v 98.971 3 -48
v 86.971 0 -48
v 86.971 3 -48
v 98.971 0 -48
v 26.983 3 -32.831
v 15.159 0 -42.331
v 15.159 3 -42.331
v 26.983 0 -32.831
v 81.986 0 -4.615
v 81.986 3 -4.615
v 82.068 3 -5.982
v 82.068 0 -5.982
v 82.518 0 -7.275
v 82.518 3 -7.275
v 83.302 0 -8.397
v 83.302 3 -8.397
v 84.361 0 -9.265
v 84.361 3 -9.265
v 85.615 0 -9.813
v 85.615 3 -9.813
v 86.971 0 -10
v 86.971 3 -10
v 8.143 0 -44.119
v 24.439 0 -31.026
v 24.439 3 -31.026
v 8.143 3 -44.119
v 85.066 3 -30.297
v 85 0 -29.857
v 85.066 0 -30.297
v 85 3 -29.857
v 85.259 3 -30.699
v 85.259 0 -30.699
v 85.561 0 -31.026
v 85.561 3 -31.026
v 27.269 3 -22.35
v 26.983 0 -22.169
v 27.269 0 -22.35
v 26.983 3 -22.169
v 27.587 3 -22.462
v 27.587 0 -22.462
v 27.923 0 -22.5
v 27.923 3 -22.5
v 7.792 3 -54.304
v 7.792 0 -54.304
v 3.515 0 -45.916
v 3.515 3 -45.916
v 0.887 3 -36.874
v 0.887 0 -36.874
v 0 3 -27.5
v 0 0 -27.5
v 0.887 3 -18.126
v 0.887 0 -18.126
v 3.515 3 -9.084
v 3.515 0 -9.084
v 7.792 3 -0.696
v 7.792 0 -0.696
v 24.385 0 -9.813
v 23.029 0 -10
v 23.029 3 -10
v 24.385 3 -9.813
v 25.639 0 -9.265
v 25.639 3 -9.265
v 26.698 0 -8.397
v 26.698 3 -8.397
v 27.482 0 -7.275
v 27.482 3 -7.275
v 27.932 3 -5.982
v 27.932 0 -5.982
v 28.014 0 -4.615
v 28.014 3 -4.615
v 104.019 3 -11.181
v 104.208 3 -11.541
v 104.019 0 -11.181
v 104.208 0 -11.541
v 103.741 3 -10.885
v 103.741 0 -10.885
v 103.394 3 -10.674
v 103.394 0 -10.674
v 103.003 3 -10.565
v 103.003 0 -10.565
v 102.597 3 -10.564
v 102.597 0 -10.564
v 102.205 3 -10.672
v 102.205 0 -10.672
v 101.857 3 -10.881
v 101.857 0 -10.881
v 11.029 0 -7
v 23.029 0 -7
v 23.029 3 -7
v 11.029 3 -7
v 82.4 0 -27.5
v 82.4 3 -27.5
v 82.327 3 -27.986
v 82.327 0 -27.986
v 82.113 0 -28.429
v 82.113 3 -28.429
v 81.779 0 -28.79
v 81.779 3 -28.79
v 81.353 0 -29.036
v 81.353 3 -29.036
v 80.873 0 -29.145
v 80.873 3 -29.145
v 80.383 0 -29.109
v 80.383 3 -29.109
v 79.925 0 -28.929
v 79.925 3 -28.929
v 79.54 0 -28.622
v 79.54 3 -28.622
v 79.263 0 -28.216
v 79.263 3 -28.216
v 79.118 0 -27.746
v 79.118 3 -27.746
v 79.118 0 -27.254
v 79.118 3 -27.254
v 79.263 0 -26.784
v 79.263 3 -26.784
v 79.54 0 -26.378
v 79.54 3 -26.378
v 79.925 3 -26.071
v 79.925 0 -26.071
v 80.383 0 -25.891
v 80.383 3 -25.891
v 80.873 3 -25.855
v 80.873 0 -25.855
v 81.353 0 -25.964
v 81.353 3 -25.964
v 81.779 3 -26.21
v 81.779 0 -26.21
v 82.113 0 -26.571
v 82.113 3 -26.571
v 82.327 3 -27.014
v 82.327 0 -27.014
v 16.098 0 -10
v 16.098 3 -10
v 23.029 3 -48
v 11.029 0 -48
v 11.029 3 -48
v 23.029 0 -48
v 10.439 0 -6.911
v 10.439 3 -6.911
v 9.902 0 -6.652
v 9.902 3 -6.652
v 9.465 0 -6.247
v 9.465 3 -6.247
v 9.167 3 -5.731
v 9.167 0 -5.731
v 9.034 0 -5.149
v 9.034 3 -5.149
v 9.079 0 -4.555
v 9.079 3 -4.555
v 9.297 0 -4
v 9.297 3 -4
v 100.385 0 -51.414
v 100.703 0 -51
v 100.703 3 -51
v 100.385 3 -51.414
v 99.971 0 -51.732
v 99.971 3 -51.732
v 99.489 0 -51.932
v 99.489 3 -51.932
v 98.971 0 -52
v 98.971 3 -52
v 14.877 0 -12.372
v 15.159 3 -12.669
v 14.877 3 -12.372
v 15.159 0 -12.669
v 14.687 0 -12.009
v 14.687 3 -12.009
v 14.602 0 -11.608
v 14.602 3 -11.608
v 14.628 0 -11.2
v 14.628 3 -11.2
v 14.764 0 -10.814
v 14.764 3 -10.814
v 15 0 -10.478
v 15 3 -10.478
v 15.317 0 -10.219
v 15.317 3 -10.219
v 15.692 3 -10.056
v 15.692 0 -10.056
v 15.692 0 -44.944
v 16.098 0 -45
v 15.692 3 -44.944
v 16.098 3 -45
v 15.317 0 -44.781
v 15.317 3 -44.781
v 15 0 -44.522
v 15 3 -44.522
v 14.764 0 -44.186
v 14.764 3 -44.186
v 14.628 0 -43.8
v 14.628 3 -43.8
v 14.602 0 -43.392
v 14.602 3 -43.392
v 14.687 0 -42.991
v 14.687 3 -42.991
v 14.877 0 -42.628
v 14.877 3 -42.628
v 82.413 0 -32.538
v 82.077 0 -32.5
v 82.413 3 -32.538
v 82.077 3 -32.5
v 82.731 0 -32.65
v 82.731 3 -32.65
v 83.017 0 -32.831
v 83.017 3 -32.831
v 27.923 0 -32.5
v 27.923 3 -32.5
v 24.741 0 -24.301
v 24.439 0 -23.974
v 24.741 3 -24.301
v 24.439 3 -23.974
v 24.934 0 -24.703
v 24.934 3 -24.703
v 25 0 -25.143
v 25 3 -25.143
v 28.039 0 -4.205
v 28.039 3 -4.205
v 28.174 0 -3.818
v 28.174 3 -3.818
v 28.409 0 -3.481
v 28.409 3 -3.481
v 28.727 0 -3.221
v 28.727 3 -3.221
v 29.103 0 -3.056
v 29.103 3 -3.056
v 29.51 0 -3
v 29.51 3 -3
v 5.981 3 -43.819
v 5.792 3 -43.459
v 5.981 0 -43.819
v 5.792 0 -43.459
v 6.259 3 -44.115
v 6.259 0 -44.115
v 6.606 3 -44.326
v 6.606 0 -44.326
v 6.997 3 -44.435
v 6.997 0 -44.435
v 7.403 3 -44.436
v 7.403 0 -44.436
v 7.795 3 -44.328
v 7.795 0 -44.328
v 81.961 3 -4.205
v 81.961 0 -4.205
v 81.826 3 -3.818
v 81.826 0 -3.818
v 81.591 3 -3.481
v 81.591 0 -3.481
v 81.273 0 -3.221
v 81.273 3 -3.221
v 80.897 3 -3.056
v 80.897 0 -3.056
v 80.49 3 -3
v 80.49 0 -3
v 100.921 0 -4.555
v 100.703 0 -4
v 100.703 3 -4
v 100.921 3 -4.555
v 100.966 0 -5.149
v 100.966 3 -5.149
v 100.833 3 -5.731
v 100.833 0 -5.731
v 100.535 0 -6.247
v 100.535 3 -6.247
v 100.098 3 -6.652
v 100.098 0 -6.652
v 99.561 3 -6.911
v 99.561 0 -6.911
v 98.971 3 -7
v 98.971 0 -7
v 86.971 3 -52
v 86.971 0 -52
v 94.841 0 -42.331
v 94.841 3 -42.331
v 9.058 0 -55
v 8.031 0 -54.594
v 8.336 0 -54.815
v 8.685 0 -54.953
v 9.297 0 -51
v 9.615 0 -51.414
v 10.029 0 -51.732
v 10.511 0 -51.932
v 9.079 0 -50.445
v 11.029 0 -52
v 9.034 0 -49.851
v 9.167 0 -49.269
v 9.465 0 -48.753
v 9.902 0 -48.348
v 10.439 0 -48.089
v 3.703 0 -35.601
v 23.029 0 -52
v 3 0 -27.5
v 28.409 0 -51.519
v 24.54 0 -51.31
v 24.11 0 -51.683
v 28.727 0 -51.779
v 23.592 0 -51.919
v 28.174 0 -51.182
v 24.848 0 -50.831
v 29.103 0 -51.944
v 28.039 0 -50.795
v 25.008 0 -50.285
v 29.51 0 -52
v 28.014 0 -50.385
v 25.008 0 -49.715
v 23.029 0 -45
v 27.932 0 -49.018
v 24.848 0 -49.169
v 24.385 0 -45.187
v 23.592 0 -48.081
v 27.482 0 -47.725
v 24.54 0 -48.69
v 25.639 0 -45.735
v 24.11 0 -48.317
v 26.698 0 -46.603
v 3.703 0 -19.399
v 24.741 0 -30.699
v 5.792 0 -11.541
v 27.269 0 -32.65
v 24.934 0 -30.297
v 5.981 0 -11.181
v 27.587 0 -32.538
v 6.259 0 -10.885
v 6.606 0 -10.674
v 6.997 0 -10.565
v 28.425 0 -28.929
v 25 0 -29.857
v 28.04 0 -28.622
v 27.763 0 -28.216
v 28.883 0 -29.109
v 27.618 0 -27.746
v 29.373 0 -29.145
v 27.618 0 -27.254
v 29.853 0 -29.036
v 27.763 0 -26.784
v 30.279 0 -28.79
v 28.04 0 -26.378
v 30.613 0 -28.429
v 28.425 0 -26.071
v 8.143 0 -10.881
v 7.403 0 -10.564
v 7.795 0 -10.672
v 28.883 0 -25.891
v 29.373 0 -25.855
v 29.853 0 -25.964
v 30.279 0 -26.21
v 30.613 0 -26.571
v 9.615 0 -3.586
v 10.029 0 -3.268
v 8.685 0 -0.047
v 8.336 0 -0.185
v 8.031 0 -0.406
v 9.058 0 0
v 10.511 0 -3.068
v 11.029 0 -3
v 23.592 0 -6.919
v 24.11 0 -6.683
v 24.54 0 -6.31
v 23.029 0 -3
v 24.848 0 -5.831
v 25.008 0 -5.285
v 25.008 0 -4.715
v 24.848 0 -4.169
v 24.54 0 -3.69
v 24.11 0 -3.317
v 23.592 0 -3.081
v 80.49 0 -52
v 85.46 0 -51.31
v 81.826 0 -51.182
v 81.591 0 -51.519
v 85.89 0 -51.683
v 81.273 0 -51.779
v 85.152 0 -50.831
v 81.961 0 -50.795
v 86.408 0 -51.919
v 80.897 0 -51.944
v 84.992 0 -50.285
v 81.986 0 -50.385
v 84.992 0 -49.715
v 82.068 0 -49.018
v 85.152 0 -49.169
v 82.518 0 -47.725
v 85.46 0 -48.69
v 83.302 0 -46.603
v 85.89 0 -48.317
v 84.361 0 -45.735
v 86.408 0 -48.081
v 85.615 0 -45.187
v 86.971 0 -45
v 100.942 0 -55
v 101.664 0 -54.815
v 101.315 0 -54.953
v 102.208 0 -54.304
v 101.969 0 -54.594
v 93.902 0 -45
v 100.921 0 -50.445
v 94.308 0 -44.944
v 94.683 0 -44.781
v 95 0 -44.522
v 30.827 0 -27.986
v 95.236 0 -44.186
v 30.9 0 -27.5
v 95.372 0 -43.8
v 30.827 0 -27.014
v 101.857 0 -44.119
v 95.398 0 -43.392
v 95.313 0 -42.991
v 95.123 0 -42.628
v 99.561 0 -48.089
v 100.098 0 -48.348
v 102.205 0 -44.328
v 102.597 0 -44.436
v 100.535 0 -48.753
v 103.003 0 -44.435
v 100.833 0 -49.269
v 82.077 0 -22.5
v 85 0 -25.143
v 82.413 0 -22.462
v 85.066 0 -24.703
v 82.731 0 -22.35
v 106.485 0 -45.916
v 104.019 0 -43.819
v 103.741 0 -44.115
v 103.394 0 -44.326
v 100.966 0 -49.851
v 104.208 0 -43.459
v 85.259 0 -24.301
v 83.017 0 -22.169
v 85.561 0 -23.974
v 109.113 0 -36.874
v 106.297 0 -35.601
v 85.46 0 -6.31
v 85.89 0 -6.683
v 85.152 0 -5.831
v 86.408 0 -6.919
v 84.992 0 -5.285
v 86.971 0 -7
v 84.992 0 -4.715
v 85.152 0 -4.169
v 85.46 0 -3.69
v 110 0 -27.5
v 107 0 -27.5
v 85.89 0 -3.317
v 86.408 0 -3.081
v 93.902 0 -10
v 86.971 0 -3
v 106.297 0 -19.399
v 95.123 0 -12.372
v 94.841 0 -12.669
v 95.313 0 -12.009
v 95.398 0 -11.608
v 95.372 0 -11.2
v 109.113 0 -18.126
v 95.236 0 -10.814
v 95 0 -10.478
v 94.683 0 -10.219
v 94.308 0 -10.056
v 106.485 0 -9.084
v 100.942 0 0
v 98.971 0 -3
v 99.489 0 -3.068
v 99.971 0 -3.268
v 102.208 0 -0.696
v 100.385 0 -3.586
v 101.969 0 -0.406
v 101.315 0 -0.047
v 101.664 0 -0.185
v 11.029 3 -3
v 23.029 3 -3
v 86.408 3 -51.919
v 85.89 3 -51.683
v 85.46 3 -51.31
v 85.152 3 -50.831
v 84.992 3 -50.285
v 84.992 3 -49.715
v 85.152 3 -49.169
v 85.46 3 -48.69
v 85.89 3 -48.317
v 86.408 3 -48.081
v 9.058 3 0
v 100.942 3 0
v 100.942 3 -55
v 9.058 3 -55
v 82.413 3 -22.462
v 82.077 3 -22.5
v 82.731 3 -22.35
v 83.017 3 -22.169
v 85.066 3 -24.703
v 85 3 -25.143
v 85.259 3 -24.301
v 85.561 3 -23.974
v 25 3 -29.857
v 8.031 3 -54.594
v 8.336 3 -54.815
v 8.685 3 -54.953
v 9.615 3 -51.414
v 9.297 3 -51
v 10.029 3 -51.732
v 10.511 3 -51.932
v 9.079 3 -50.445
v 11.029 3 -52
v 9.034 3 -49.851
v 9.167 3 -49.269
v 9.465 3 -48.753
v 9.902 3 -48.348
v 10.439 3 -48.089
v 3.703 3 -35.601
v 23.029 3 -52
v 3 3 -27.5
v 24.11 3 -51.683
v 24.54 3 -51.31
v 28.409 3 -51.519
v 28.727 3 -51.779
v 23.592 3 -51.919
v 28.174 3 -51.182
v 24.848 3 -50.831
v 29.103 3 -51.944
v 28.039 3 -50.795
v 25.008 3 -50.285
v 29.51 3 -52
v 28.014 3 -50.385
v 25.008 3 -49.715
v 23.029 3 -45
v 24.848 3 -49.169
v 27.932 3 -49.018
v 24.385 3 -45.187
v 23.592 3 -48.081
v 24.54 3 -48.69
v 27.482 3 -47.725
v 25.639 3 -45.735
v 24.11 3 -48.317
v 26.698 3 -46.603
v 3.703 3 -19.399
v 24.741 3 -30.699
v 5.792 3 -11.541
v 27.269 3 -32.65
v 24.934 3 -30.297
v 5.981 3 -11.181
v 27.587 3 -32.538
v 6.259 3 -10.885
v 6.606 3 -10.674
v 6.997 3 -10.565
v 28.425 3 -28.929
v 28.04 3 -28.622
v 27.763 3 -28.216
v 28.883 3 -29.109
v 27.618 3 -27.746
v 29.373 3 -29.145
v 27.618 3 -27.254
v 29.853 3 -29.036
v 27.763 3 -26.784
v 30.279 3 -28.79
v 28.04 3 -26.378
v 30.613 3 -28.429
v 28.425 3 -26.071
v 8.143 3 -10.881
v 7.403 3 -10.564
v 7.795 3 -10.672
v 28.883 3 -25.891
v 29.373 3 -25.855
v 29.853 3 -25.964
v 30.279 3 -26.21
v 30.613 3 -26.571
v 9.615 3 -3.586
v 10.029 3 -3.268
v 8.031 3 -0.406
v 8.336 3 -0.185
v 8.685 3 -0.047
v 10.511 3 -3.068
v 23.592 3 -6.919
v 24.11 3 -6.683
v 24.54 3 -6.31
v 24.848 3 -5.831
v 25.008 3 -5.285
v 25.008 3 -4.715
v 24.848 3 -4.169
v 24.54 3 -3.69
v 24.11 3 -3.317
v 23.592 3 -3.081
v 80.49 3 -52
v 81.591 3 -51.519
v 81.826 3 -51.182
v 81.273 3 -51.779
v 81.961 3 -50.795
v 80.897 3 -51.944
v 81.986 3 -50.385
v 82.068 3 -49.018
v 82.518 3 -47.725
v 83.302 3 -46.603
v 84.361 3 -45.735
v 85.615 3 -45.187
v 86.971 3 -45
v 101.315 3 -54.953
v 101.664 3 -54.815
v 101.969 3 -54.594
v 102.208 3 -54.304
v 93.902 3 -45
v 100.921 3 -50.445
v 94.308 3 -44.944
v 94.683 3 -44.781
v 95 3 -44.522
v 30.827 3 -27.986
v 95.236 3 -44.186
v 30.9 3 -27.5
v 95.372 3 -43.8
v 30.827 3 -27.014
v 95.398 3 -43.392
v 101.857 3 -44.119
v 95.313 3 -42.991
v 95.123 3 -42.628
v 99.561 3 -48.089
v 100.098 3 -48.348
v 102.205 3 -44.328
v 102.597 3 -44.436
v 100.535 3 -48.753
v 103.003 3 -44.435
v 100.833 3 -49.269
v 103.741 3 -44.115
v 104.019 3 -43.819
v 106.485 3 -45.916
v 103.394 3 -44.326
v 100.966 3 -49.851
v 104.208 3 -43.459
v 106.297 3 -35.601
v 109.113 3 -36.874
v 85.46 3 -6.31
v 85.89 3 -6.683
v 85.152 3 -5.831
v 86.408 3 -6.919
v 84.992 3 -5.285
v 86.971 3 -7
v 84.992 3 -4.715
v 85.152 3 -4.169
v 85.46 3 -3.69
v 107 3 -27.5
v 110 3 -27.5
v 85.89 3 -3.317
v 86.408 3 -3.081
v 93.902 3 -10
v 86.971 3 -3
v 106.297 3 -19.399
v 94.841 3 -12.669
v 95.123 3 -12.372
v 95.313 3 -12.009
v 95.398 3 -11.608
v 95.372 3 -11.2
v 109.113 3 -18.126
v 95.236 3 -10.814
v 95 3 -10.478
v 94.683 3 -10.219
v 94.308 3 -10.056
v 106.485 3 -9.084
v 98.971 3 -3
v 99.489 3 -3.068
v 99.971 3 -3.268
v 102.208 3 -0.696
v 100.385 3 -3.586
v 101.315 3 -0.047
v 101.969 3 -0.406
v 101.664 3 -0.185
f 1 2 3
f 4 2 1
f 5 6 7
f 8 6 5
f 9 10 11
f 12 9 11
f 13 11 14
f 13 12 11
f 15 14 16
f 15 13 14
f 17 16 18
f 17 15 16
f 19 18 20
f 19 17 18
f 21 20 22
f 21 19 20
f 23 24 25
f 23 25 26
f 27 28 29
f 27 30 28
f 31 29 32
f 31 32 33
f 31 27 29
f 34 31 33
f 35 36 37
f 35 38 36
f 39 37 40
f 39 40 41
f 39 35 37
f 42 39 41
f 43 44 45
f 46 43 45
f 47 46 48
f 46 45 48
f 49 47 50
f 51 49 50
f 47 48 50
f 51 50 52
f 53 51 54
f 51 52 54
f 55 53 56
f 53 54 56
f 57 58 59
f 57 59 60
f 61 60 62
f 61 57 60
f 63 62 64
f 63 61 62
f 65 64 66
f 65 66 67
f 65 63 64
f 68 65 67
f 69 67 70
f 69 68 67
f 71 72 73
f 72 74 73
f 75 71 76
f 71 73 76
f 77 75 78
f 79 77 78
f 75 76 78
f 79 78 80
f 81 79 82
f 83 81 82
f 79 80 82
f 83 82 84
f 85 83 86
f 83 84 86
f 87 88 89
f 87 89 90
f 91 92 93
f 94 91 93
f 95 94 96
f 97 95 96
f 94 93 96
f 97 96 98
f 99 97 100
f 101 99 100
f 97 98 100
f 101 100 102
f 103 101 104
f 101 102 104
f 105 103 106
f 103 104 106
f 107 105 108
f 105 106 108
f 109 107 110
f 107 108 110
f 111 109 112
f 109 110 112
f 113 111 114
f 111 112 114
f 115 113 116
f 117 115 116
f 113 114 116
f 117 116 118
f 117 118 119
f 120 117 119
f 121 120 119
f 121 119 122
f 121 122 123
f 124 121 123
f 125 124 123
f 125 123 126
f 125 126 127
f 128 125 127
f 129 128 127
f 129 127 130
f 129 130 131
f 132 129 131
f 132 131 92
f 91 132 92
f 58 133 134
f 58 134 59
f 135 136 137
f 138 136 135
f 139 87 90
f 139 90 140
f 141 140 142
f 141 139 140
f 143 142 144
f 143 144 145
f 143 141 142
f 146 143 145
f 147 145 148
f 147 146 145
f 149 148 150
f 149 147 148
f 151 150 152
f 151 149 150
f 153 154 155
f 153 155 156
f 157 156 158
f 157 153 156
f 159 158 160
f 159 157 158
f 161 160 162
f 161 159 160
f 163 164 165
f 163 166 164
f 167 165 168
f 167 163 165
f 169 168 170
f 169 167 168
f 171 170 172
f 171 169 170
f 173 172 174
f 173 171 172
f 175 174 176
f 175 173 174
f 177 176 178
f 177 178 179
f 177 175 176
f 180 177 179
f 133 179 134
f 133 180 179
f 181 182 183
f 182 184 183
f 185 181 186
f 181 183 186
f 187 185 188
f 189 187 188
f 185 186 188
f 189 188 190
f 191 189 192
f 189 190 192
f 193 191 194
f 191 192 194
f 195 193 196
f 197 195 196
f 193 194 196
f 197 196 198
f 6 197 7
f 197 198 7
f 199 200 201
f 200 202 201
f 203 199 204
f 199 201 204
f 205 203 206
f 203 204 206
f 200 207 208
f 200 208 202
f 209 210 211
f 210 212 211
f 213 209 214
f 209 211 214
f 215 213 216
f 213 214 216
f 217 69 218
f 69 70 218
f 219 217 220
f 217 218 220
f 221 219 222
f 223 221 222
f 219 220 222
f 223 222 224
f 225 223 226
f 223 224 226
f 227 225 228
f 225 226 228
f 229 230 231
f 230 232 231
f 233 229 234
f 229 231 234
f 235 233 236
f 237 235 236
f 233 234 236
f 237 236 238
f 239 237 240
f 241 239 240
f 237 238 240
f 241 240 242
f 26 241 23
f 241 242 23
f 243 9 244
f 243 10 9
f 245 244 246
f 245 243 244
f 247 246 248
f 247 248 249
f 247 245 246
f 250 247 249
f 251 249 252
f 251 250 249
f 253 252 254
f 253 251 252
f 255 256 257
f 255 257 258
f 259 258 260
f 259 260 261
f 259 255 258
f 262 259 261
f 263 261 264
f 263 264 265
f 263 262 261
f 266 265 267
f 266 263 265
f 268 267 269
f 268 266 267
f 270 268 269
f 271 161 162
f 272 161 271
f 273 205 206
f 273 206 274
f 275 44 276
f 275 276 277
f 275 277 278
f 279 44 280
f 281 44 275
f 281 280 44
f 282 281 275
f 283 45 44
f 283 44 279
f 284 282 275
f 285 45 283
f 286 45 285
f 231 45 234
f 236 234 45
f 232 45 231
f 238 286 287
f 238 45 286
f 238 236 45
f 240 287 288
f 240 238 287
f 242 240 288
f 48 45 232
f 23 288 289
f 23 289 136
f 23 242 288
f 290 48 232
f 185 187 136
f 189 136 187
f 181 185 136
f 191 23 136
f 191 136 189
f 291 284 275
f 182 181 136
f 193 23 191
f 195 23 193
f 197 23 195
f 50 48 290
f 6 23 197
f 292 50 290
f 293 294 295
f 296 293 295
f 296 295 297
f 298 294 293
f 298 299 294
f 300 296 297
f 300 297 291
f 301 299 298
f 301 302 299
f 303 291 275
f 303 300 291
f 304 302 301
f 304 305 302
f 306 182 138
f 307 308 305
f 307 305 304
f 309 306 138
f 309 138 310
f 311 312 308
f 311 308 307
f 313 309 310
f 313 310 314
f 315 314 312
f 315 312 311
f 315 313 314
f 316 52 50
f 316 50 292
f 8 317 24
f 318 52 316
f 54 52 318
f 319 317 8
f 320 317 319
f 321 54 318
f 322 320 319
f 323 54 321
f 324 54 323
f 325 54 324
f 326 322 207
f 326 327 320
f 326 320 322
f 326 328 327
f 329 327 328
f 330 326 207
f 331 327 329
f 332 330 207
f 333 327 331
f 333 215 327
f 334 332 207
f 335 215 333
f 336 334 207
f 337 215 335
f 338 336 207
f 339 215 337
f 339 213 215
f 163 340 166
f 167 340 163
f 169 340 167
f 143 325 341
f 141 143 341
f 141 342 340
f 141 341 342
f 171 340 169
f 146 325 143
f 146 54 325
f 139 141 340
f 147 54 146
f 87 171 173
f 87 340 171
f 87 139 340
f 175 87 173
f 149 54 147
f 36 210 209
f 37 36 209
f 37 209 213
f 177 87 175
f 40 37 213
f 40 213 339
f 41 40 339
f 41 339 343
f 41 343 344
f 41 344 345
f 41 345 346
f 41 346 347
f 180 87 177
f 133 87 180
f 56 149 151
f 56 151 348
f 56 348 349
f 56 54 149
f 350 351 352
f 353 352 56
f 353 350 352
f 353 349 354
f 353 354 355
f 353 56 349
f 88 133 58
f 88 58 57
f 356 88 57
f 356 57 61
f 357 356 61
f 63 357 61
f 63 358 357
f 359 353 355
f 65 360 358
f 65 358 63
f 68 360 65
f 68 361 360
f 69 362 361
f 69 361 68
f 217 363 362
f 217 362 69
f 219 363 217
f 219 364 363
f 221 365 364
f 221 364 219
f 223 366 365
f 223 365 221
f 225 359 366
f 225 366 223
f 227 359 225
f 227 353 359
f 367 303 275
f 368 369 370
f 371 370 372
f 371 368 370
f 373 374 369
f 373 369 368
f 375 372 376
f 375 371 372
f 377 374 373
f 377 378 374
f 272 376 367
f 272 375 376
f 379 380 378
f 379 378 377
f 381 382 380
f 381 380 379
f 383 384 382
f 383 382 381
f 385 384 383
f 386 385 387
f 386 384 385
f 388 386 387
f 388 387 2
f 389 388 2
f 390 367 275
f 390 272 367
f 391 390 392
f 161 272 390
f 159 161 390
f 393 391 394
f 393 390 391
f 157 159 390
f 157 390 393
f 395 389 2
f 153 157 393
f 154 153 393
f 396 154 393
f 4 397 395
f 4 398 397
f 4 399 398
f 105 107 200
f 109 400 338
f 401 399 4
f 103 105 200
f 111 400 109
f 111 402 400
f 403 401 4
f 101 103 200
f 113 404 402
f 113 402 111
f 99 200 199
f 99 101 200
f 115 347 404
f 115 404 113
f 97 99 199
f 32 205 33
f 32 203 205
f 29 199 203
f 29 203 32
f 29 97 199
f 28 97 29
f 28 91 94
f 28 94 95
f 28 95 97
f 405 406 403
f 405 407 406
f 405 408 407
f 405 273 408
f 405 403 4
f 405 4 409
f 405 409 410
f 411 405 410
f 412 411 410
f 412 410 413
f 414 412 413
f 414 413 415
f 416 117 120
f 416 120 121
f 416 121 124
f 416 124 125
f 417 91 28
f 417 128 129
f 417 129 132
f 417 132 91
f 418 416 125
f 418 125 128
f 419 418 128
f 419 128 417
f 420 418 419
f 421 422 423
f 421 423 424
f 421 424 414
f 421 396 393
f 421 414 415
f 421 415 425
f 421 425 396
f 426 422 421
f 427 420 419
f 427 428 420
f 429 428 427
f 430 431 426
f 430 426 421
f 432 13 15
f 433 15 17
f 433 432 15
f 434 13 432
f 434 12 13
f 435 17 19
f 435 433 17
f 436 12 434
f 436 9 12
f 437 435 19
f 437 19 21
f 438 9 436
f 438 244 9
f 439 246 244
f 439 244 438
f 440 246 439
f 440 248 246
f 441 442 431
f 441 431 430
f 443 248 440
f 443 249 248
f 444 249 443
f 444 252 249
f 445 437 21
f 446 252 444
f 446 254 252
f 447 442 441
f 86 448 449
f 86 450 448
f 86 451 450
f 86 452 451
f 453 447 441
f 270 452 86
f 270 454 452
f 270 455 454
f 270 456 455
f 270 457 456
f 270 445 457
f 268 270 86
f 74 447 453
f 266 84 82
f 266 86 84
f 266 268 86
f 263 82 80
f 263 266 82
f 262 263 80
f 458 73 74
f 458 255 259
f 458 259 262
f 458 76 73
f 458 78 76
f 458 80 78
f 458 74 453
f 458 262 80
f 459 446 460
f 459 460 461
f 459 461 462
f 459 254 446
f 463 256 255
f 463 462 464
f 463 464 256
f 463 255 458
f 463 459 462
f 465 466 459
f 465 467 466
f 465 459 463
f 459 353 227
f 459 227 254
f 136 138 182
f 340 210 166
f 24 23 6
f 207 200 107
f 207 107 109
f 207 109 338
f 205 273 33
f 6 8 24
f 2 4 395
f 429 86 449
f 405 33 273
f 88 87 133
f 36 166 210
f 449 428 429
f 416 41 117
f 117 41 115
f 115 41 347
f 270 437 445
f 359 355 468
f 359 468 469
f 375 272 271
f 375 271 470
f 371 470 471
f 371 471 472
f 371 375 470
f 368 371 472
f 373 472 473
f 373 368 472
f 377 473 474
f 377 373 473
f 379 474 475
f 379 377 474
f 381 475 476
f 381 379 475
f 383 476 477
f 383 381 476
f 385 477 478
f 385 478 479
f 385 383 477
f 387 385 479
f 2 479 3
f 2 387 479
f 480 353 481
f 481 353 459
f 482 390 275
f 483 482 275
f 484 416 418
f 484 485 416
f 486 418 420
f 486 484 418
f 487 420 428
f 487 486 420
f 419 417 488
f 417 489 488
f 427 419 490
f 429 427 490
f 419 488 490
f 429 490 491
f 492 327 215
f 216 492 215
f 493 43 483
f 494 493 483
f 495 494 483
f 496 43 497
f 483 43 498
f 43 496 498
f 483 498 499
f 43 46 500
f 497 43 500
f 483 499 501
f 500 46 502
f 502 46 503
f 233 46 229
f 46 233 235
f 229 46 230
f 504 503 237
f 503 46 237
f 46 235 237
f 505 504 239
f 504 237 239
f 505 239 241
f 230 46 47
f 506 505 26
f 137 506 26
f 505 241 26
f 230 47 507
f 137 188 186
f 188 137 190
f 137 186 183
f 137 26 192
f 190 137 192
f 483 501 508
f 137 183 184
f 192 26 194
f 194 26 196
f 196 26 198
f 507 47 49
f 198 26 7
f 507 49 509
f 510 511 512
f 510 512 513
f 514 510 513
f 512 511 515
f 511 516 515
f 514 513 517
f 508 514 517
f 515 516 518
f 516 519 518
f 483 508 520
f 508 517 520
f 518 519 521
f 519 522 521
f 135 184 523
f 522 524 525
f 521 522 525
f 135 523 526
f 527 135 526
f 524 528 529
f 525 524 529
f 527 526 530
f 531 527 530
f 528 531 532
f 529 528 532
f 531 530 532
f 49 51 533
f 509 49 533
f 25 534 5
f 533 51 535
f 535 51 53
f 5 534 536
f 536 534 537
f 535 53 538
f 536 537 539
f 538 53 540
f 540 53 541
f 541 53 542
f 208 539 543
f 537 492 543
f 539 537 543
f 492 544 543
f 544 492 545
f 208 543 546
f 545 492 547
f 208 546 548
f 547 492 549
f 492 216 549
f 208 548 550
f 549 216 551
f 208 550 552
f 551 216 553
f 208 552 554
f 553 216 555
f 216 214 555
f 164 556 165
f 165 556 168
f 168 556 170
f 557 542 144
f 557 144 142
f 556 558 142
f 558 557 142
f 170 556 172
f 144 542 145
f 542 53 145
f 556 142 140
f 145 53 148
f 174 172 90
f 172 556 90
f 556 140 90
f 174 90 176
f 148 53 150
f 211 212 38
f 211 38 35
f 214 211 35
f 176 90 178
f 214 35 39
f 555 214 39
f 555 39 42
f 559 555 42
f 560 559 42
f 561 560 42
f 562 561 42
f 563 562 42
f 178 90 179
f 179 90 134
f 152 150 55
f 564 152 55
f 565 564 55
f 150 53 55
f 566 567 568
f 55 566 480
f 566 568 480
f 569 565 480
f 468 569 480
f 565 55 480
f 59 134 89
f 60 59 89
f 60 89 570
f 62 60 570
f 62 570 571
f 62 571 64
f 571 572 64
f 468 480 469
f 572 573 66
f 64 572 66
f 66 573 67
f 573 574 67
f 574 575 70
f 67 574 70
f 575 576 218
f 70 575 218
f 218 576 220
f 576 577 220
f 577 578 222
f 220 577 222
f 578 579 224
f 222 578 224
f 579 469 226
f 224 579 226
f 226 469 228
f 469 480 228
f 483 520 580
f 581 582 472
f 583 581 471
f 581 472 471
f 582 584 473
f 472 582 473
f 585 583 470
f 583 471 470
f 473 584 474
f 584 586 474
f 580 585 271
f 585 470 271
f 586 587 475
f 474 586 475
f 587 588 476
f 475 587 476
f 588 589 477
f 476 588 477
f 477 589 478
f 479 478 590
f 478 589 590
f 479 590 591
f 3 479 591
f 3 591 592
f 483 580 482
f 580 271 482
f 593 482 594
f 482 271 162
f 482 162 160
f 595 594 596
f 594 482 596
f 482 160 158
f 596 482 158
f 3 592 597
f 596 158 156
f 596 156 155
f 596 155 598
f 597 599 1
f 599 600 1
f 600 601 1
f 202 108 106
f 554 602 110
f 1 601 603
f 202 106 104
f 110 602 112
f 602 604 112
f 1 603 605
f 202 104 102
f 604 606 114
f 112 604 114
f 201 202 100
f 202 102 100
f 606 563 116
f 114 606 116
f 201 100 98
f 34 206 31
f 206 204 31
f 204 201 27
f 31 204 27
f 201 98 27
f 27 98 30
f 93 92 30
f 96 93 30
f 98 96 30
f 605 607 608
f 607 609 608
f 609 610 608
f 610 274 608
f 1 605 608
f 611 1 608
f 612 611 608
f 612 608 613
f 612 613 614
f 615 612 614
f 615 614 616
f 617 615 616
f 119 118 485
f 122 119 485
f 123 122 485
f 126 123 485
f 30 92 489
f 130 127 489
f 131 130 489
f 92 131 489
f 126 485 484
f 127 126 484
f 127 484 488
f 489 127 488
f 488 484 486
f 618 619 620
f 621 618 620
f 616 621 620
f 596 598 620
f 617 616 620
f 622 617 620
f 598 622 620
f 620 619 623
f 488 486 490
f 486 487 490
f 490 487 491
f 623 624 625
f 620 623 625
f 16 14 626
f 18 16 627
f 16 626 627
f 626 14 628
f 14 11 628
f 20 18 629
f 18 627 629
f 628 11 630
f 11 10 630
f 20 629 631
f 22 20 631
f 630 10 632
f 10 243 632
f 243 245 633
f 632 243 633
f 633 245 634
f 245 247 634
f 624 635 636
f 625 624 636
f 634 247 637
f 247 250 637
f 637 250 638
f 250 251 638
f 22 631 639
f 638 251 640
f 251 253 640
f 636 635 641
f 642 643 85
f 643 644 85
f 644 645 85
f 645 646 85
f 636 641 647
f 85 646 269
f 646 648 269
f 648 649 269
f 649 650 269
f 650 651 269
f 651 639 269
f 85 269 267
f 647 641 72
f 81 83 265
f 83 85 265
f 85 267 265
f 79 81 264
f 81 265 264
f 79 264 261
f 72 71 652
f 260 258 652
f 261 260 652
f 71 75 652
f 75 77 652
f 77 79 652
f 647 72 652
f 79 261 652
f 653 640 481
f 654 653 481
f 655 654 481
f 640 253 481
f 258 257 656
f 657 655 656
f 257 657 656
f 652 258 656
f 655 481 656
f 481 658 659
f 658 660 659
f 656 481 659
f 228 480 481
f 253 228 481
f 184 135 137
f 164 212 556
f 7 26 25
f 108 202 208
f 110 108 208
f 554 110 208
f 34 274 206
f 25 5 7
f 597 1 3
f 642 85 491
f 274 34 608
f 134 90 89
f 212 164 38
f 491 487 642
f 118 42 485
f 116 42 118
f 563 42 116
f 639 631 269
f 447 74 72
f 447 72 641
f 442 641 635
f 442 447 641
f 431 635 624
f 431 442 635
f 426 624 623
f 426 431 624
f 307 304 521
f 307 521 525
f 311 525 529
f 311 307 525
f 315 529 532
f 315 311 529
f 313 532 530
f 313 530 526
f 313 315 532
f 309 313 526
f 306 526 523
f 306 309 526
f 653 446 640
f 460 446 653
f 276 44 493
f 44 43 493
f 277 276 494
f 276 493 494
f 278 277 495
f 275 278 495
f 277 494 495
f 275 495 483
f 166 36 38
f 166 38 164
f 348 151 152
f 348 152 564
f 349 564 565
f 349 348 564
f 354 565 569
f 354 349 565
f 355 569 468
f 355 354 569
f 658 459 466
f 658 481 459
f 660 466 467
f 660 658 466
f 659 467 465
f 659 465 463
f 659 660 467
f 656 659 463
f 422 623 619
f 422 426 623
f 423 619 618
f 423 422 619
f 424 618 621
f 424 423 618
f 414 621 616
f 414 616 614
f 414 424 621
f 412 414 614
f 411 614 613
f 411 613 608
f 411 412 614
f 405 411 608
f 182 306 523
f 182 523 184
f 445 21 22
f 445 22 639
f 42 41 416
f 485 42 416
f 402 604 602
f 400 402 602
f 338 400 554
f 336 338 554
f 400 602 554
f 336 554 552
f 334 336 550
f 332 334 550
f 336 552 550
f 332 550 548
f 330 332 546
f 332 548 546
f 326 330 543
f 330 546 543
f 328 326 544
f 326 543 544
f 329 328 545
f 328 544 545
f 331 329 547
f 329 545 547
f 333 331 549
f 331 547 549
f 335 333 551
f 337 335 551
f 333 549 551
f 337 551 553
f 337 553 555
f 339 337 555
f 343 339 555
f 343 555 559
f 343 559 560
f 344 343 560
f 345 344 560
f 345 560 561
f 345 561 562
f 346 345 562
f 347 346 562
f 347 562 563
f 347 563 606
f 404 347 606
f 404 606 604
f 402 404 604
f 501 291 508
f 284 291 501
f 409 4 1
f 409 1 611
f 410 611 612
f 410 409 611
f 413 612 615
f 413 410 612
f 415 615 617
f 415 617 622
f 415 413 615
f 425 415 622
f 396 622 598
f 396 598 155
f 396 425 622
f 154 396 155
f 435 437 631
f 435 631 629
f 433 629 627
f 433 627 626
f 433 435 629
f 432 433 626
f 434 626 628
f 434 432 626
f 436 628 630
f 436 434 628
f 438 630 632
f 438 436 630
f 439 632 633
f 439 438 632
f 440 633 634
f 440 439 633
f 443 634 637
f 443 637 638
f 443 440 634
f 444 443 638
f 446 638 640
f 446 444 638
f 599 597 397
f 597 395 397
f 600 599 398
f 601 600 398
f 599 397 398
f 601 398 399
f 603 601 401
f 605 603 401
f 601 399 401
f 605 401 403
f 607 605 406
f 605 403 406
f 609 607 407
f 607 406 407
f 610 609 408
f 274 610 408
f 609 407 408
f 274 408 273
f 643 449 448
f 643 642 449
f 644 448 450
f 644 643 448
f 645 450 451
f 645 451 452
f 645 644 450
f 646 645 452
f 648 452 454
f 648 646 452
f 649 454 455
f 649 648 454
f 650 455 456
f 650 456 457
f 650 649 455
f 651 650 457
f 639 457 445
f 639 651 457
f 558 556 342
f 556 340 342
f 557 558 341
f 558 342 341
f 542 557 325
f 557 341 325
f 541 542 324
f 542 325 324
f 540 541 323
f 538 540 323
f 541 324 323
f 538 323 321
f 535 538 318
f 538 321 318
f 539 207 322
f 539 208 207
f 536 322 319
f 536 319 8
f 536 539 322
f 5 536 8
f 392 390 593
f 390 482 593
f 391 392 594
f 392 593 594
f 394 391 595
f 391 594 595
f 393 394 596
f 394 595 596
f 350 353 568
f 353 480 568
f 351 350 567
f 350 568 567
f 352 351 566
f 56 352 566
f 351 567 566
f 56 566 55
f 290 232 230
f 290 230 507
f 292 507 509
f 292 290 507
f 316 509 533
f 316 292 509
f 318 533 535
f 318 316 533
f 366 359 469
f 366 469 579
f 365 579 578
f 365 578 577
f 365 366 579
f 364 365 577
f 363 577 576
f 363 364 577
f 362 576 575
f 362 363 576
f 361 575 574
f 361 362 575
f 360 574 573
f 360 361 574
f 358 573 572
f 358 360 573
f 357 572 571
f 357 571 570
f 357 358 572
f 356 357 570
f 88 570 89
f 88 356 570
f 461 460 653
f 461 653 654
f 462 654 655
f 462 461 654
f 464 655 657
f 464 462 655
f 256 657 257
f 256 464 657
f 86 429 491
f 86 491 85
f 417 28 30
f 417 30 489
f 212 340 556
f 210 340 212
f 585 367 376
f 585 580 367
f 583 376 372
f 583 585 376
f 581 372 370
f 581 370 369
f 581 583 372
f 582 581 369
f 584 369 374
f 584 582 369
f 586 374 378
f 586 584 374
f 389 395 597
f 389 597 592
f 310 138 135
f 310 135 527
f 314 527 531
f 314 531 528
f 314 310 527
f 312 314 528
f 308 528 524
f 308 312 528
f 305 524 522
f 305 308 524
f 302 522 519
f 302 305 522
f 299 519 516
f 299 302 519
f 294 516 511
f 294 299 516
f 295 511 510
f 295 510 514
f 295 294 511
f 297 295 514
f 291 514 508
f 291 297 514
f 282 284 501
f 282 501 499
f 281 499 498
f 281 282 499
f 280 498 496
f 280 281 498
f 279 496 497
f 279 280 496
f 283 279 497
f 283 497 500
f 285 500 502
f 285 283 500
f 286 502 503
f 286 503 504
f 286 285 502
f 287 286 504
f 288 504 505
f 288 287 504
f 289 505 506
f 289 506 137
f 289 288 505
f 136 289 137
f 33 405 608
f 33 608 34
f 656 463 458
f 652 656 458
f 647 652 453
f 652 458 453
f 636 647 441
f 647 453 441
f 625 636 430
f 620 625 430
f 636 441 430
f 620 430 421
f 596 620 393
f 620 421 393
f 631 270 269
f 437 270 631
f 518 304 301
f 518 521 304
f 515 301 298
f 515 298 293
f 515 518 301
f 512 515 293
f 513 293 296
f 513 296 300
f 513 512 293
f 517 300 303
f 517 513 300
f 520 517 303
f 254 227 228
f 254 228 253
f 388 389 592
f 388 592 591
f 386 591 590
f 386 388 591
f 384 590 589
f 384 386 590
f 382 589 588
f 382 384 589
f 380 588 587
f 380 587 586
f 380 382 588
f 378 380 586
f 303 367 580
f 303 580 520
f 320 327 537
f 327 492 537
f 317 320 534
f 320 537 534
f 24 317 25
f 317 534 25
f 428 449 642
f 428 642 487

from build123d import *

# Parameters (mm, degrees)
EXTRUDE_1_DEPTH = 3
SKETCH_3_W      = 60
SKETCH_3_H      = 10
EXTRUDE_3_DEPTH = 3
EXTRUDE_4_DEPTH = 3
EXTRUDE_5_DEPTH = 3
FILLET_1_R      = 1.5
FILLET_2_R      = 1.5
M4X0_71_D       = 3.3


with BuildPart() as part:
    # Эскиз1 → Бобышка-Вытянуть1 (new body)
    with BuildSketch(Plane(origin=(0, 0, 0), x_dir=(1, 0, 0), z_dir=(0, 1, 0))):
        with BuildLine():
            Line((8.241767279, 0), (101.758232721, 0))
            ThreePointArc((101.758232721, 0), (110, 27.5), (101.758232721, 55))
            Line((101.758232721, 55), (8.241767279, 55))
            ThreePointArc((8.241767279, 55), (0, 27.5), (8.241767279, 0))
        make_face()
        with BuildLine():
            Line((9.890774129, 3), (100.109225871, 3))
            ThreePointArc((100.109225871, 3), (107, 27.5), (100.109225871, 52))
            Line((100.109225871, 52), (9.890774129, 52))
            ThreePointArc((9.890774129, 52), (3, 27.5), (9.890774129, 3))
        make_face(mode=Mode.SUBTRACT)
    extrude(amount=EXTRUDE_1_DEPTH)

    # Эскиз4 → Бобышка-Вытянуть4 (add, through all)
    with BuildSketch(Plane.XZ):
        with BuildLine():
            Line((27.611432525, -3), (23.02885683, -3))
            ThreePointArc((23.02885683, -3), (25.02885683, -5), (23.02885683, -7))
            Line((23.02885683, -7), (11.02885683, -7))
            ThreePointArc((11.02885683, -7), (9.296806041, -6.000000032), (9.296805985, -4.000000064))
            ThreePointArc((9.296805985, -4.000000064), (8.176529623, -6.057114801), (7.160134889, -8.167489628))
            ThreePointArc((7.160134889, -8.167489628), (8.888465293, -9.51870823), (11.02885683, -10))
            Line((11.02885683, -10), (23.02885683, -10))
            ThreePointArc((23.02885683, -10), (27.212156962, -7.738612788), (27.611432525, -3))
        make_face()
        with BuildLine():
            ThreePointArc((9.296805985, -4.000000064), (10.028856798, -3.267949211), (11.02885683, -3))
            Line((11.02885683, -3), (9.890774129, -3))
            ThreePointArc((9.890774129, -3), (9.590696591, -3.498162612), (9.296805985, -4.000000064))
        make_face()
        with BuildLine():
            Line((86.97114317, -3), (82.388567475, -3))
            ThreePointArc((82.388567475, -3), (82.787843038, -7.738612788), (86.97114317, -10))
            Line((86.97114317, -10), (98.97114317, -10))
            ThreePointArc((98.97114317, -10), (101.111534707, -9.51870823), (102.839865111, -8.167489628))
            ThreePointArc((102.839865111, -8.167489628), (101.823470359, -6.057114766), (100.703193976, -3.999999997))
            ThreePointArc((100.703193976, -3.999999997), (100.703193979, -5.999999998), (98.97114317, -7))
            Line((98.97114317, -7), (86.97114317, -7))
            ThreePointArc((86.97114317, -7), (84.97114317, -5), (86.97114317, -3))
        make_face()
        with BuildLine():
            Line((100.109225871, -3), (98.97114317, -3))
            ThreePointArc((98.97114317, -3), (99.971143169, -3.267949191), (100.703193976, -3.999999997))
            ThreePointArc((100.703193976, -3.999999997), (100.409303389, -3.498162579), (100.109225871, -3))
        make_face()
        with BuildLine():
            ThreePointArc((100.703194034, -50.999999903), (101.823470385, -48.942885182), (102.839865111, -46.832510372))
            ThreePointArc((102.839865111, -46.832510372), (101.111534707, -45.48129177), (98.97114317, -45))
            Line((98.97114317, -45), (86.97114317, -45))
            ThreePointArc((86.97114317, -45), (82.787843038, -47.261387212), (82.388567475, -52))
            Line((82.388567475, -52), (86.97114317, -52))
            ThreePointArc((86.97114317, -52), (84.97114317, -50), (86.97114317, -48))
            Line((86.97114317, -48), (98.97114317, -48))
            ThreePointArc((98.97114317, -48), (100.70319395, -48.999999951), (100.703194034, -50.999999903))
        make_face()
        with BuildLine():
            ThreePointArc((100.109225871, -52), (100.409303419, -51.501837371), (100.703194034, -50.999999903))
            ThreePointArc((100.703194034, -50.999999903), (99.971143219, -51.732050779), (98.97114317, -52))
            Line((98.97114317, -52), (100.109225871, -52))
        make_face()
        with BuildLine():
            ThreePointArc((11.02885683, -45), (8.888465293, -45.48129177), (7.160134889, -46.832510372))
            ThreePointArc((7.160134889, -46.832510372), (8.17652965, -48.942885251), (9.296806044, -51.000000038))
            ThreePointArc((9.296806044, -51.000000038), (9.296806011, -49.000000019), (11.02885683, -48))
            Line((11.02885683, -48), (23.02885683, -48))
            ThreePointArc((23.02885683, -48), (25.02885683, -50), (23.02885683, -52))
            Line((23.02885683, -52), (27.611432525, -52))
            ThreePointArc((27.611432525, -52), (27.212156962, -47.261387212), (23.02885683, -45))
            Line((23.02885683, -45), (11.02885683, -45))
        make_face()
        with BuildLine():
            ThreePointArc((11.02885683, -52), (10.028856848, -51.732050818), (9.296806044, -51.000000038))
            ThreePointArc((9.296806044, -51.000000038), (9.590696621, -51.501837438), (9.890774129, -52))
            Line((9.890774129, -52), (11.02885683, -52))
        make_face()
    extrude(amount=-EXTRUDE_4_DEPTH)



with BuildPart() as body_2:
    # Эскиз3 → Бобышка-Вытянуть3 (new body, through all)
    with BuildSketch(Plane.XZ):
        with Locations((55, -27.5)):
            Rectangle(SKETCH_3_W, SKETCH_3_H)
    extrude(amount=-EXTRUDE_3_DEPTH)


with BuildPart() as part_1:
    add(part.part)

    add(body_2.part)  # Бобышка-Вытянуть5 merges body 2
    # Эскиз5 → Бобышка-Вытянуть5 (add, through all)
    with BuildSketch(Plane.XZ):
        Polygon((27.394984288, -22.5), (8.099598255, -6.998127159), (6.220671523, -9.336852098), (25, -24.424125375), (25, -22.5), align=None)
        Polygon((25, -30.575874625), (6.220671523, -45.663147902), (8.099598255, -48.001872841), (27.394984288, -32.5), (25, -32.5), align=None)
        Polygon((101.900401745, -6.998127159), (82.605015712, -22.5), (85, -22.5), (85, -24.424125375), (103.779328477, -9.336852098), align=None)
        Polygon((82.605015712, -32.5), (101.900401745, -48.001872841), (103.779328477, -45.663147902), (85, -30.575874625), (85, -32.5), align=None)
    extrude(amount=-EXTRUDE_5_DEPTH)

    # Скругление1
    fillet_1_edges = [part_1.edges().sort_by_distance(p)[0] for p in [
        (11.836069059, 1.5, -45),
        (6.543612581, 1.5, -45.403697731),
        (27.394984288, 1.5, -32.5),
        (25, 1.5, -30.575874625),
        (98.163930941, 1.5, -10),
        (103.456387419, 1.5, -9.596302269),
        (82.605015712, 1.5, -22.5),
        (85, 1.5, -24.424125375),
        (27.394984288, 1.5, -22.5),
        (98.163930941, 1.5, -45),
        (103.456387419, 1.5, -45.403697731),
        (25, 1.5, -24.424125375),
        (82.605015712, 1.5, -32.5),
        (85, 1.5, -30.575874625),
        (11.836069059, 1.5, -10),
        (6.543612581, 1.5, -9.596302269),
        (27.611432525, 1.5, -52),
        (82.388567475, 1.5, -3),
        (27.611432525, 1.5, -3),
        (82.388567475, 1.5, -52),
    ]]
    fillet(fillet_1_edges, radius=FILLET_1_R)

    # Скругление2
    fillet_2_edges = [part_1.edges().sort_by_distance(p)[0] for p in [
        (8.241767279, 1.5, -55),
        (8.241767279, 1.5, 0),
        (101.758232721, 1.5, 0),
        (101.758232721, 1.5, -55),
    ]]
    fillet(fillet_2_edges, radius=FILLET_2_R)

    # Отверстие обработанное метчиком M4x0.71 (through all)
    with Locations(Plane(origin=(-0.1210586, 0, 3.198200318), x_dir=(-1, 0, 0), z_dir=(0, -1, 0))):
        with Locations((-80.8710586, 30.698200318), (-29.3710586, 30.698200318)):
            Hole(M4X0_71_D / 2)


solid = part_1.part
